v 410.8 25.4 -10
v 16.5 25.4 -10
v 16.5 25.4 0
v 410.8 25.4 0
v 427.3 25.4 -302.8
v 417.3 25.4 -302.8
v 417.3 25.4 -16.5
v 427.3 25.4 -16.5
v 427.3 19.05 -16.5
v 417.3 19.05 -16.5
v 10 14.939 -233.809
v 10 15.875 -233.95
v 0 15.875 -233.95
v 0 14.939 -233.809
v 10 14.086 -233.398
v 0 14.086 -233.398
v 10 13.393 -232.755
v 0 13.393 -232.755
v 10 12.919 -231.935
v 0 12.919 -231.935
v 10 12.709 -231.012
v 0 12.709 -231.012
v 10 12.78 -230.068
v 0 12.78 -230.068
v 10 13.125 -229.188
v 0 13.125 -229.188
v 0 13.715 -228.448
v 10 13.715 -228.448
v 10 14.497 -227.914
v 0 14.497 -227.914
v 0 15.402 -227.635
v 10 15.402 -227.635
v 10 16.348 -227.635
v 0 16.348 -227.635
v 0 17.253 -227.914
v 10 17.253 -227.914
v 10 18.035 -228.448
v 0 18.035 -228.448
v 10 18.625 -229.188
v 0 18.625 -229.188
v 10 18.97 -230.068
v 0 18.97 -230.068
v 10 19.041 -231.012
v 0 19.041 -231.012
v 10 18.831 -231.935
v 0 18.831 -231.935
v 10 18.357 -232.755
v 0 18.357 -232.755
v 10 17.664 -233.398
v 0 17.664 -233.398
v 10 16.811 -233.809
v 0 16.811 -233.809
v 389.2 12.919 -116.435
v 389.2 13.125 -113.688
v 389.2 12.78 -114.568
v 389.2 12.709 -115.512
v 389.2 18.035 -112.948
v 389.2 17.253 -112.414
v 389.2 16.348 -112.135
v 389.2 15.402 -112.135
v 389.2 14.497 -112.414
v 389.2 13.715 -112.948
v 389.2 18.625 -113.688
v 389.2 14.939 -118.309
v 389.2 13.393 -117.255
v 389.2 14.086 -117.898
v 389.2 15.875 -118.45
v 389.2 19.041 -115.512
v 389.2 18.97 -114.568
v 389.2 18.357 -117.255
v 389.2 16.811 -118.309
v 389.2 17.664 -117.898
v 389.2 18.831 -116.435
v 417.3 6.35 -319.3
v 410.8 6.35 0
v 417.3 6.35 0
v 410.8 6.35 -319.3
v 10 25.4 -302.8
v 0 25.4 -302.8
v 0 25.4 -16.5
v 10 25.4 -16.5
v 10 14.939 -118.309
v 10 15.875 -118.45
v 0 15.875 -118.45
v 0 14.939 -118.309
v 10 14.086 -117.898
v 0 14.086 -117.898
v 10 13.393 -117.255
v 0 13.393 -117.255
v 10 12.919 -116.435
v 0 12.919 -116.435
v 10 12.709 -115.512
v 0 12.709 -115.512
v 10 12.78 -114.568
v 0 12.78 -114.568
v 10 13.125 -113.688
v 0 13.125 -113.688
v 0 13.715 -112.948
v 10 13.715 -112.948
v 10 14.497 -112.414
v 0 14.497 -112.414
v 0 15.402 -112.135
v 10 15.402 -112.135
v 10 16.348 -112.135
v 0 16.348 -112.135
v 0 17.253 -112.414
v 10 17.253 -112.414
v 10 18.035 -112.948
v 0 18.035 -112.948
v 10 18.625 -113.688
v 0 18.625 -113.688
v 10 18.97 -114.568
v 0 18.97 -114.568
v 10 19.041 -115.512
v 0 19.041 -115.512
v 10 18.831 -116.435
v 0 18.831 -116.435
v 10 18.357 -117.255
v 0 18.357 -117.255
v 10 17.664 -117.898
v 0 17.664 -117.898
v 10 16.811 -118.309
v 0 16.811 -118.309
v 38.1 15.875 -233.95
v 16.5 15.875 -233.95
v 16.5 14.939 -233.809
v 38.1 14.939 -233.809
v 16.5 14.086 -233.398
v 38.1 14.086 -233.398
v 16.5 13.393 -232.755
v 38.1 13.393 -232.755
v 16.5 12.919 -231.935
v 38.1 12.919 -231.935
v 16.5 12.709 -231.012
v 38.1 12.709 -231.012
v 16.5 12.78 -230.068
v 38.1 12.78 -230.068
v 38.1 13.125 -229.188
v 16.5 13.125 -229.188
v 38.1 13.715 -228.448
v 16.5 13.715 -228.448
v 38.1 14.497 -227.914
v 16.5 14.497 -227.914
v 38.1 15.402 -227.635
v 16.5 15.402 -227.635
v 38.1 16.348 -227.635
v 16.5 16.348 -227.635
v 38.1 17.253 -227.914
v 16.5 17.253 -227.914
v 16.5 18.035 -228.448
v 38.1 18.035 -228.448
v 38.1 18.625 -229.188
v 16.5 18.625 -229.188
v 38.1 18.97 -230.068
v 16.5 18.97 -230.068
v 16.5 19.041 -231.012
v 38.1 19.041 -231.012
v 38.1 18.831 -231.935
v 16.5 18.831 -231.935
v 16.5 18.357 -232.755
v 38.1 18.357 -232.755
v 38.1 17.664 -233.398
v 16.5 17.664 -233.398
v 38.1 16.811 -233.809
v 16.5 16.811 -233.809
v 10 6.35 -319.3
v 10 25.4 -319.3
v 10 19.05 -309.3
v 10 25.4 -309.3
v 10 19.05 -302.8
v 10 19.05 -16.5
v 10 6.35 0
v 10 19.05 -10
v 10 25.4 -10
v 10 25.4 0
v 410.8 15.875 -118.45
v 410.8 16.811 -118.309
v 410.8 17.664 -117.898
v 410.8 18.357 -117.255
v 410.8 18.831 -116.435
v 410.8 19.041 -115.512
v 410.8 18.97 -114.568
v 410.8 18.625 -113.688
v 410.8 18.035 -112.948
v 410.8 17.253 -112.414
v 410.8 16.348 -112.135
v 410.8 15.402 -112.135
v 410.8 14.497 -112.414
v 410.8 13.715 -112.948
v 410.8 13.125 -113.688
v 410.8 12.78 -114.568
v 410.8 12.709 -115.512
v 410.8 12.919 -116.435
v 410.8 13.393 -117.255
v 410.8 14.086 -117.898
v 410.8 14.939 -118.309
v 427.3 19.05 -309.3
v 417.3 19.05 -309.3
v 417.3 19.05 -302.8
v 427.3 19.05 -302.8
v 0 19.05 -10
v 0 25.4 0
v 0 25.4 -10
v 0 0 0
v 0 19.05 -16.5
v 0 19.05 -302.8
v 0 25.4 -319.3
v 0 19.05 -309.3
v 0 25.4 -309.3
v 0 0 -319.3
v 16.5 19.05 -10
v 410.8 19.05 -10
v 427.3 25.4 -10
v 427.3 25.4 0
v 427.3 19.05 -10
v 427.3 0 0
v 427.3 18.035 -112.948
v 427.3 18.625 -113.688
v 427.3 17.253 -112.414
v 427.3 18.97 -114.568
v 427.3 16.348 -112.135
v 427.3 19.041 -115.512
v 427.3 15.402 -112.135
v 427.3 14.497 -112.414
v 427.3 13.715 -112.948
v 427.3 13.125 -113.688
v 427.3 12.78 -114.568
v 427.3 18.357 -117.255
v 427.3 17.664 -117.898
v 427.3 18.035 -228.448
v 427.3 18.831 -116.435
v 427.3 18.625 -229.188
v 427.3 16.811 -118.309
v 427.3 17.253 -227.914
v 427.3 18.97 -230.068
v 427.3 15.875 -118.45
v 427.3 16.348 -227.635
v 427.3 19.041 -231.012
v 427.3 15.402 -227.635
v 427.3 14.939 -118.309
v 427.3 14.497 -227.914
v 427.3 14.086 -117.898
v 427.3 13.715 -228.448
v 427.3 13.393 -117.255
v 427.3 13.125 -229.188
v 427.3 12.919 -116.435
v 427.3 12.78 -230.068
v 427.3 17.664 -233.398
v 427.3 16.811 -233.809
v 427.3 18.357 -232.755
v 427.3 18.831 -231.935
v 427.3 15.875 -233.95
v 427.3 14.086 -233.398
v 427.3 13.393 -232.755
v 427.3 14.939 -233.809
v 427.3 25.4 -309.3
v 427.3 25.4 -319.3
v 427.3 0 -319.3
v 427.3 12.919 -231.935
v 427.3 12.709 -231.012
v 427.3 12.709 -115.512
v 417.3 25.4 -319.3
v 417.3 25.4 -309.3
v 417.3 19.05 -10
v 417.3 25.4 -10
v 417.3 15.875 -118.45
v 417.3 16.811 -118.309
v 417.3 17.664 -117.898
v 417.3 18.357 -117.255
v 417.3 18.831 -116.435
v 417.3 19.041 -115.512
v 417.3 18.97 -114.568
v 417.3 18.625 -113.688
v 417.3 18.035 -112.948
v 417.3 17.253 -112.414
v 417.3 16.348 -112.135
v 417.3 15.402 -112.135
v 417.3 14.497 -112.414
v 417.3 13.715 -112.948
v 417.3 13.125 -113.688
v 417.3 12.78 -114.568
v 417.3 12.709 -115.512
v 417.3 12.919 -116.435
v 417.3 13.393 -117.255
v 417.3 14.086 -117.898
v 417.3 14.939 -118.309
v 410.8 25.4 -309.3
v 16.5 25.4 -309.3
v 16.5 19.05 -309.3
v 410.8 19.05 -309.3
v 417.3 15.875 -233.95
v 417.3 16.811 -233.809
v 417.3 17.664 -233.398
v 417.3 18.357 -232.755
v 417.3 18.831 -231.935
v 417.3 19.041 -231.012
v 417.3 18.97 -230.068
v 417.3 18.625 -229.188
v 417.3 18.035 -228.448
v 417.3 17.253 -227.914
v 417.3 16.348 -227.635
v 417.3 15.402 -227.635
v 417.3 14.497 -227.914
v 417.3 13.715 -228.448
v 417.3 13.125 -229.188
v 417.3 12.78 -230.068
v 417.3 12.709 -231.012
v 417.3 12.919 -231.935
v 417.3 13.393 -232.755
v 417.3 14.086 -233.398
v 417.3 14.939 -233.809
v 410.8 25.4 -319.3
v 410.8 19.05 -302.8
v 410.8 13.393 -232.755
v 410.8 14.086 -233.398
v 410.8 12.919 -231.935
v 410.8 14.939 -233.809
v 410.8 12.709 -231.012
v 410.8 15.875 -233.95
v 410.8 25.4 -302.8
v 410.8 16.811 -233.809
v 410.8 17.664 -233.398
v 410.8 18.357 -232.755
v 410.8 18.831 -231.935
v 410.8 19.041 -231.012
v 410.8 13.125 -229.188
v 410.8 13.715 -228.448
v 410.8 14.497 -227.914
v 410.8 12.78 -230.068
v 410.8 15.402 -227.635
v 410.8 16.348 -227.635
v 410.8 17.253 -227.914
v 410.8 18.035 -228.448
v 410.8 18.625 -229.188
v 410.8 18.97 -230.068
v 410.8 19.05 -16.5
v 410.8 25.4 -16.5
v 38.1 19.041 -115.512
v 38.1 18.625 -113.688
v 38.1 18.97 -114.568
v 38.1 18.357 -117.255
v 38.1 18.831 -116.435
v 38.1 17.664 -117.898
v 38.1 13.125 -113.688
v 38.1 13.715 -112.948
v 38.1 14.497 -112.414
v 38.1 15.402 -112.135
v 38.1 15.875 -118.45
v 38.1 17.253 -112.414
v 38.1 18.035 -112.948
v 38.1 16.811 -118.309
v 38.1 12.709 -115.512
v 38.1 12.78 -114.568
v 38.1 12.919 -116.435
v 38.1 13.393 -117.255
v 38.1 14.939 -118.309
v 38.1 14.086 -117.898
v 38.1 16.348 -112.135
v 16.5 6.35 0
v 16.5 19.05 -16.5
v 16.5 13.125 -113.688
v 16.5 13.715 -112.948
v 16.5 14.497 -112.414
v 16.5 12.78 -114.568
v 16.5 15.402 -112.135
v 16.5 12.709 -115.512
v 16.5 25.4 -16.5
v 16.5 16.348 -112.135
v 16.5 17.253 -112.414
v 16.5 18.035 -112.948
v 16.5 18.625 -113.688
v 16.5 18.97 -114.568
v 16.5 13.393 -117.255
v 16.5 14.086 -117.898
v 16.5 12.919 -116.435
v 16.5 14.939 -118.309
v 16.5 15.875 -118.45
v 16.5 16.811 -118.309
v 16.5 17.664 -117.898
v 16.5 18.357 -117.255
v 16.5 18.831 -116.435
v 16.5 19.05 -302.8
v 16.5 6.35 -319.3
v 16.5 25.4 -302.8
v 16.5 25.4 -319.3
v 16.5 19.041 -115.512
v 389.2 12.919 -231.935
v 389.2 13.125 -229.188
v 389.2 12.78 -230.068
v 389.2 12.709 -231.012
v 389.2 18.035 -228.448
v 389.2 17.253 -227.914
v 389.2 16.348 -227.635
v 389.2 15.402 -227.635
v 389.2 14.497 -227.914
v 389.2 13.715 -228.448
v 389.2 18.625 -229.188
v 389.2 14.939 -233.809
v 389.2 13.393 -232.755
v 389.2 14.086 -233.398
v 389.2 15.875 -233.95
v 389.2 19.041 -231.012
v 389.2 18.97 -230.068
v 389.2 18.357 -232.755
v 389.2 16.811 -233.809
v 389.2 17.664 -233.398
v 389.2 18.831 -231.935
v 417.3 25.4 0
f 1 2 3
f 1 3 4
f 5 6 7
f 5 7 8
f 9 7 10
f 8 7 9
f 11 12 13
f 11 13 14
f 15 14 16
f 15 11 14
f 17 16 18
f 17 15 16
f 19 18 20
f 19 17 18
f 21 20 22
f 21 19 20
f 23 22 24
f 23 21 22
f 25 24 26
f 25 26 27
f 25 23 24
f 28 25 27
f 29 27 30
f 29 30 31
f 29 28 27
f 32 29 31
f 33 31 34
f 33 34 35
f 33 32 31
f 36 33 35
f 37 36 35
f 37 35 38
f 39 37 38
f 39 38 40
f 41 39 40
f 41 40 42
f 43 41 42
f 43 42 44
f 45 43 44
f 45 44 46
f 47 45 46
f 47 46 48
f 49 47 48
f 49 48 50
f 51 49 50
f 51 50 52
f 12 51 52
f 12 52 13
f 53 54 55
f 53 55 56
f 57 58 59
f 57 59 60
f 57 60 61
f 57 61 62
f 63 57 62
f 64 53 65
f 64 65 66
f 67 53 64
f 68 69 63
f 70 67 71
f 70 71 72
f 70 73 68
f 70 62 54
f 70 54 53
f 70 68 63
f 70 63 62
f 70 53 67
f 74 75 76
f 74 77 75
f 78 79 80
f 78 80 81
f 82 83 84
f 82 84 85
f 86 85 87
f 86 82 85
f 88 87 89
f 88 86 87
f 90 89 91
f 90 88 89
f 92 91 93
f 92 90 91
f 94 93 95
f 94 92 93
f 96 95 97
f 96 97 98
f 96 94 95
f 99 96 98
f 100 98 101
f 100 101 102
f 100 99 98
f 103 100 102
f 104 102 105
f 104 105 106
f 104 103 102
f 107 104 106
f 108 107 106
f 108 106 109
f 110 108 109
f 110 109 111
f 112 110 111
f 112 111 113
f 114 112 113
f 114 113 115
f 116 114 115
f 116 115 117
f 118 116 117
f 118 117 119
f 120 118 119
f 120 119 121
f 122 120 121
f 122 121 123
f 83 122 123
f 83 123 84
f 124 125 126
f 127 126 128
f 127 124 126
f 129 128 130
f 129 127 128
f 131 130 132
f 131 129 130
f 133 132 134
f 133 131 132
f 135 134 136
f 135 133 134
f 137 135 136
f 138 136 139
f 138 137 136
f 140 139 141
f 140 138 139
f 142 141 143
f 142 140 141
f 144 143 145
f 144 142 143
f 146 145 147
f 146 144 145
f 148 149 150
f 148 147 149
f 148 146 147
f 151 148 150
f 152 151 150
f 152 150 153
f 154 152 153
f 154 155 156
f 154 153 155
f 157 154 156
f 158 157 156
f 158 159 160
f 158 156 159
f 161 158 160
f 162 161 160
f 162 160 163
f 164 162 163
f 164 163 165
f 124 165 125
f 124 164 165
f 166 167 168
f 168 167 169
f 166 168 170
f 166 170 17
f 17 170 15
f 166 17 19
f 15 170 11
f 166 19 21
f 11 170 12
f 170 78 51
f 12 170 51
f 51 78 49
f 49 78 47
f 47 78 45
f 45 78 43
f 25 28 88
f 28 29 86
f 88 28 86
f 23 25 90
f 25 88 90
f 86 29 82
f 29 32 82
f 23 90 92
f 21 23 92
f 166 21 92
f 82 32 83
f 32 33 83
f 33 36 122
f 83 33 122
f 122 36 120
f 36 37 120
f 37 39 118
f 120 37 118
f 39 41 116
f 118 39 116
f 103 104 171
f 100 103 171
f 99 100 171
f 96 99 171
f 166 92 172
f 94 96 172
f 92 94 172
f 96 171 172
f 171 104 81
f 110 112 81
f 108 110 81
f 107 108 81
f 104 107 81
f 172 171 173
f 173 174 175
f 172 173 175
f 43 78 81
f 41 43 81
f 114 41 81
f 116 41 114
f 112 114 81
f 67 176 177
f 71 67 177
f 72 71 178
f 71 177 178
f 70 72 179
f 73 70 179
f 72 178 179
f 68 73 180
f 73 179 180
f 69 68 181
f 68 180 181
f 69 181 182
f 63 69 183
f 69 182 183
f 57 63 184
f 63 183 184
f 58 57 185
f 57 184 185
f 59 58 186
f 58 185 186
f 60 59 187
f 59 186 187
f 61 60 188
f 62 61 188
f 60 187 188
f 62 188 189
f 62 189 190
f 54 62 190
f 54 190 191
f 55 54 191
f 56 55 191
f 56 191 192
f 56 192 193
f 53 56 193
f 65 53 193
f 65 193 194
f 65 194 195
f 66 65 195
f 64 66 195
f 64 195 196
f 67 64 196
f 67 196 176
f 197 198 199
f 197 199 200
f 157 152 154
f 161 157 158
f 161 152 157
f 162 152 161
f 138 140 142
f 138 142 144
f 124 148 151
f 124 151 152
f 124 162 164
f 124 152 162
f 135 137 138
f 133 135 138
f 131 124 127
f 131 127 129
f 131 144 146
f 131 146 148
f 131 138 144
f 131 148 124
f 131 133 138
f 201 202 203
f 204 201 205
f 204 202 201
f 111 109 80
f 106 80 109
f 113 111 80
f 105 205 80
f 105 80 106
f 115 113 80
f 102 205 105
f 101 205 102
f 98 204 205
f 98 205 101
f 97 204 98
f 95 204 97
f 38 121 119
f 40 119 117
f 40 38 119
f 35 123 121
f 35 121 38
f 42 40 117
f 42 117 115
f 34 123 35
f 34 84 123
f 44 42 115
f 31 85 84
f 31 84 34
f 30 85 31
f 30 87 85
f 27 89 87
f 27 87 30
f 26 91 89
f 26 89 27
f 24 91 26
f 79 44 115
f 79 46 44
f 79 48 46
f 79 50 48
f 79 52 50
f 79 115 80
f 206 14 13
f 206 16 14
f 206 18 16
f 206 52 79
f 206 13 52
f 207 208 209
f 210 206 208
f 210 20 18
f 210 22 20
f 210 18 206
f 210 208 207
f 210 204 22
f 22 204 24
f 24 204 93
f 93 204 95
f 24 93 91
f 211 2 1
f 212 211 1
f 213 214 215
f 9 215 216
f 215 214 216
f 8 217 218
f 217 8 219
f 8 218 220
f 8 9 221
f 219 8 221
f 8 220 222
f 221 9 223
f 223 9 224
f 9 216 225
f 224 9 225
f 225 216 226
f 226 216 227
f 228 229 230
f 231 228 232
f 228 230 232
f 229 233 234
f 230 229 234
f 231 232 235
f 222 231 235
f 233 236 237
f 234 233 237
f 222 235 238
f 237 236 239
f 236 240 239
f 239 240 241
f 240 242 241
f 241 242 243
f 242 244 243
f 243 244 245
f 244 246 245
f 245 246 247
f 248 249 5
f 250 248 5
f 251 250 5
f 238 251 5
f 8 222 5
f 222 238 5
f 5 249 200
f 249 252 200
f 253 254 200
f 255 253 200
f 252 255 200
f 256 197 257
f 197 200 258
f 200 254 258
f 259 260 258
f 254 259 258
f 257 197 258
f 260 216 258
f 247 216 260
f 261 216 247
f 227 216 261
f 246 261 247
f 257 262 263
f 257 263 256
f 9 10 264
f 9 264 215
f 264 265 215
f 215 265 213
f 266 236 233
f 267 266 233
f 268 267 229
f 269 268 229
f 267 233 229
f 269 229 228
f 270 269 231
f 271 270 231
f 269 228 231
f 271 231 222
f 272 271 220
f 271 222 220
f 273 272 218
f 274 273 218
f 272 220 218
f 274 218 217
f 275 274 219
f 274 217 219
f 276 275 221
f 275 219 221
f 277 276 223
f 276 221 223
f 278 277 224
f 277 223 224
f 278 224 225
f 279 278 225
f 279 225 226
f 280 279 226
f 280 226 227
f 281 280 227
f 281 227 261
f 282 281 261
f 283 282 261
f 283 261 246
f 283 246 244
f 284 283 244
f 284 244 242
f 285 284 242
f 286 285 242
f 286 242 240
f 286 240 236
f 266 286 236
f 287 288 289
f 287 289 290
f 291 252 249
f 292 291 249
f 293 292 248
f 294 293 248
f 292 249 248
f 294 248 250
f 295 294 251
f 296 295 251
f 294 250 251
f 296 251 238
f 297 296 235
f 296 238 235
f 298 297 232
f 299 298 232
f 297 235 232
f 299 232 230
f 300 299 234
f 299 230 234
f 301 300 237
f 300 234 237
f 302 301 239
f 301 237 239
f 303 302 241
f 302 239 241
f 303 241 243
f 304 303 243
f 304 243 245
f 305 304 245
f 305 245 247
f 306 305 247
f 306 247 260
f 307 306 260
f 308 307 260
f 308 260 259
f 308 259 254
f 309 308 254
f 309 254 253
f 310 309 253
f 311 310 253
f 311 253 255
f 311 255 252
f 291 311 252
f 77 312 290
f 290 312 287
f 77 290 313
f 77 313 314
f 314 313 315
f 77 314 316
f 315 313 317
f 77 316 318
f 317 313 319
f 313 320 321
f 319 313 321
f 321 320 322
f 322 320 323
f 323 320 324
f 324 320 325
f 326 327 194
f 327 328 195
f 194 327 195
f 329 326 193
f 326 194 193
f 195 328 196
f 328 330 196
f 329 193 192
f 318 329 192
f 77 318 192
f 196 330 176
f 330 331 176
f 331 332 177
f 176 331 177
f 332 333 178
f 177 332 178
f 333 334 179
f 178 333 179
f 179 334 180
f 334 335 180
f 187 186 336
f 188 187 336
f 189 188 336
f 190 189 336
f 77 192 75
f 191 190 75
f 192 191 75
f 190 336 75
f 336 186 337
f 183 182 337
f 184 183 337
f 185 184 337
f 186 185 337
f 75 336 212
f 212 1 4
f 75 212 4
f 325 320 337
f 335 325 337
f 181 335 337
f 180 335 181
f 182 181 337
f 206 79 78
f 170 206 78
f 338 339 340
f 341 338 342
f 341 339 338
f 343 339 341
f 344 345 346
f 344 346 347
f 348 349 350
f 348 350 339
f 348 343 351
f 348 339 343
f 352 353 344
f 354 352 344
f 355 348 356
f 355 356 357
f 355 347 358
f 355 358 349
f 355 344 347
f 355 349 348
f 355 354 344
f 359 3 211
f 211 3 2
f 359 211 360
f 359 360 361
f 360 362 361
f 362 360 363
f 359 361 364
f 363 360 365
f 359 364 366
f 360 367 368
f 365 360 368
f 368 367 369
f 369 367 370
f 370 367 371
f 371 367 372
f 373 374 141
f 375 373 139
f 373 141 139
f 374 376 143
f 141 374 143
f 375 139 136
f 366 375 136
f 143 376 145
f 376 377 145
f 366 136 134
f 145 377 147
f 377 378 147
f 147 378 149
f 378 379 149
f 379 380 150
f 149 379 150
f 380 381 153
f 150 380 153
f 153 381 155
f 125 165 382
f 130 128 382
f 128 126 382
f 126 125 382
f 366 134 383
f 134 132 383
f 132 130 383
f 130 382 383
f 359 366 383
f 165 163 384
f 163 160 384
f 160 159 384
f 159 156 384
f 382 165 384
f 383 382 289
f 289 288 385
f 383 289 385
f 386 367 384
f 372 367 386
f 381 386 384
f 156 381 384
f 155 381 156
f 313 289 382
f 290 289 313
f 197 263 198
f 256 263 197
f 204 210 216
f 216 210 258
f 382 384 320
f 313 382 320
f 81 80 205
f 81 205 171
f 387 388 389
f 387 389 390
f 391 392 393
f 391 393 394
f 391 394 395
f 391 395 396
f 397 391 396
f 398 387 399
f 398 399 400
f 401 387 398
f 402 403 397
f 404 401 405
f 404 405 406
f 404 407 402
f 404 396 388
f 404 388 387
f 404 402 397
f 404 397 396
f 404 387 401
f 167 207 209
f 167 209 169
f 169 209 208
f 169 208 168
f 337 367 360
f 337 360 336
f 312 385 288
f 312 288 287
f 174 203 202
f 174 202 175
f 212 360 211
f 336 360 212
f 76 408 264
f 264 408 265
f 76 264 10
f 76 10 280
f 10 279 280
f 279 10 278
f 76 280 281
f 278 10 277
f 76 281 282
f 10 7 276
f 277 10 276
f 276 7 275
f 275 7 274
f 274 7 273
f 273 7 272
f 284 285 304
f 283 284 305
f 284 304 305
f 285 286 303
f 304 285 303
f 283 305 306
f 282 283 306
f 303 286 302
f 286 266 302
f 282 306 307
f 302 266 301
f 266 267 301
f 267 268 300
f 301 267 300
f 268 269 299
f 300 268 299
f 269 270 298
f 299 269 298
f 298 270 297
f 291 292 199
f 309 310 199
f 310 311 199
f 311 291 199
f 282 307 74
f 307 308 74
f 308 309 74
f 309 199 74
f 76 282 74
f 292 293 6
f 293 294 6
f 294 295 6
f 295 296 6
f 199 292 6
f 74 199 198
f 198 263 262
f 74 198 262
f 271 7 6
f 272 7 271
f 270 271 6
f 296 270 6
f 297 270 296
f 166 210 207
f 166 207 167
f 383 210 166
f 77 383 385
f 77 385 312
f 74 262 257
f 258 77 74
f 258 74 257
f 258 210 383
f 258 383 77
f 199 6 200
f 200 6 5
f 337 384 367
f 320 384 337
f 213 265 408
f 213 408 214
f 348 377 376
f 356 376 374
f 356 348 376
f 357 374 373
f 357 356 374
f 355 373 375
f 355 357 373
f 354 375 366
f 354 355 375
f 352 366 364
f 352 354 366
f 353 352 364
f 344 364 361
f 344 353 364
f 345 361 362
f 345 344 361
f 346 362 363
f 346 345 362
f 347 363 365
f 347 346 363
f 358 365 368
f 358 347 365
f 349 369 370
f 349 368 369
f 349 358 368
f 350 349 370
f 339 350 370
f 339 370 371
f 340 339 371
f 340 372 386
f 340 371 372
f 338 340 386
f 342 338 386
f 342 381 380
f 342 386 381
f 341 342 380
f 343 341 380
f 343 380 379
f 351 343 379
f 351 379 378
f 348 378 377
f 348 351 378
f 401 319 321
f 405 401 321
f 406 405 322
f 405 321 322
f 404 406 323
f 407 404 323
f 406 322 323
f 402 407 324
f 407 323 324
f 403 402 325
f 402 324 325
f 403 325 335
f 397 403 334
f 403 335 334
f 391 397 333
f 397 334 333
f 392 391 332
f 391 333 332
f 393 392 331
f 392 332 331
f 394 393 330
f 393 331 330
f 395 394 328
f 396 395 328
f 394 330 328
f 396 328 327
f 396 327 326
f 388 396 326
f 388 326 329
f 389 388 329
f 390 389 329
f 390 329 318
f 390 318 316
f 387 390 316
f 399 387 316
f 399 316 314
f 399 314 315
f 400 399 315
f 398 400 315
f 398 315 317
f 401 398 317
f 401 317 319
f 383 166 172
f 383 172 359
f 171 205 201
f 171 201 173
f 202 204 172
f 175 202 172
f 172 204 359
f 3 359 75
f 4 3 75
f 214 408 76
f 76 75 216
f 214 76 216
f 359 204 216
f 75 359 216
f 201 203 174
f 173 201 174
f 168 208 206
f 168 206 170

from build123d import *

# Parameters (mm, degrees)
SKETCH1_W           = 427.3
SKETCH1_H           = 319.3
BOSS_EXTRUDE1_DEPTH = 25.4
CUT_EXTRUDE1_DEPTH  = 19.05
SKETCH6_W           = 427.3
SKETCH6_H           = 6.5
CUT_EXTRUDE4_DEPTH  = 6.35
SKETCH4_R           = 3.175
CUT_EXTRUDE2_DEPTH  = 38.1
CUT_EXTRUDE3_START  = -38.1
SKETCH5_R           = 3.175
CUT_EXTRUDE3_DEPTH  = 38.1


with BuildPart() as part:
    # Sketch1 → Boss-Extrude1 (new body)
    with BuildSketch(Plane(origin=(0, 0, 0), x_dir=(1, 0, 0), z_dir=(0, 1, 0))):
        with Locations((213.65, 159.65)):
            Rectangle(SKETCH1_W, SKETCH1_H)
    extrude(amount=BOSS_EXTRUDE1_DEPTH)

    # Sketch2 → Cut-Extrude1 (cut)
    with BuildSketch(Plane(origin=(0, 25.4, 0), x_dir=(1, 0, 0), z_dir=(0, 1, 0))):
        Polygon((410.8, 302.8), (410.8, 16.5), (410.8, 10), (410.8, 0), (417.3, 0), (417.3, 10), (417.3, 16.5), (417.3, 302.8), (417.3, 309.3), (417.3, 319.3), (410.8, 319.3), (410.8, 309.3), align=None)
        Polygon((16.5, 16.5), (16.5, 302.8), (16.5, 309.3), (16.5, 319.3), (10, 319.3), (10, 309.3), (10, 302.8), (10, 16.5), (10, 10), (10, 0), (16.5, 0), (16.5, 10), align=None)
    extrude(amount=-CUT_EXTRUDE1_DEPTH, mode=Mode.SUBTRACT)

    # Sketch6 → Cut-Extrude4 (cut)
    with BuildSketch(Plane(origin=(0, 25.4, 0), x_dir=(1, 0, 0), z_dir=(0, 1, 0))):
        with Locations((213.65, 13.25)):
            Rectangle(SKETCH6_W, SKETCH6_H)
        with Locations((213.65, 306.05)):
            Rectangle(SKETCH6_W, SKETCH6_H)
    extrude(amount=-CUT_EXTRUDE4_DEPTH, mode=Mode.SUBTRACT)

    # Sketch4 → Cut-Extrude2 (cut)
    with BuildSketch(Plane(origin=(427.3, 0, 0), x_dir=(0, 0, -1), z_dir=(1, 0, 0))):
        with Locations((115.275, 15.875)):
            Circle(SKETCH4_R)
        with Locations((230.775, 15.875)):
            Circle(SKETCH4_R)
    extrude(amount=-CUT_EXTRUDE2_DEPTH, mode=Mode.SUBTRACT)

    # Sketch5 → Cut-Extrude3 (cut)
    with BuildSketch(Plane.ZY.offset(CUT_EXTRUDE3_START)):
        with Locations(Location((-230.775, 15.875, 0), (0, 0, 180))):
            Circle(SKETCH5_R)
        with Locations(Location((-115.275, 15.875, 0), (0, 0, 180))):
            Circle(SKETCH5_R)
    extrude(amount=CUT_EXTRUDE3_DEPTH, mode=Mode.SUBTRACT)


solid = part.part
